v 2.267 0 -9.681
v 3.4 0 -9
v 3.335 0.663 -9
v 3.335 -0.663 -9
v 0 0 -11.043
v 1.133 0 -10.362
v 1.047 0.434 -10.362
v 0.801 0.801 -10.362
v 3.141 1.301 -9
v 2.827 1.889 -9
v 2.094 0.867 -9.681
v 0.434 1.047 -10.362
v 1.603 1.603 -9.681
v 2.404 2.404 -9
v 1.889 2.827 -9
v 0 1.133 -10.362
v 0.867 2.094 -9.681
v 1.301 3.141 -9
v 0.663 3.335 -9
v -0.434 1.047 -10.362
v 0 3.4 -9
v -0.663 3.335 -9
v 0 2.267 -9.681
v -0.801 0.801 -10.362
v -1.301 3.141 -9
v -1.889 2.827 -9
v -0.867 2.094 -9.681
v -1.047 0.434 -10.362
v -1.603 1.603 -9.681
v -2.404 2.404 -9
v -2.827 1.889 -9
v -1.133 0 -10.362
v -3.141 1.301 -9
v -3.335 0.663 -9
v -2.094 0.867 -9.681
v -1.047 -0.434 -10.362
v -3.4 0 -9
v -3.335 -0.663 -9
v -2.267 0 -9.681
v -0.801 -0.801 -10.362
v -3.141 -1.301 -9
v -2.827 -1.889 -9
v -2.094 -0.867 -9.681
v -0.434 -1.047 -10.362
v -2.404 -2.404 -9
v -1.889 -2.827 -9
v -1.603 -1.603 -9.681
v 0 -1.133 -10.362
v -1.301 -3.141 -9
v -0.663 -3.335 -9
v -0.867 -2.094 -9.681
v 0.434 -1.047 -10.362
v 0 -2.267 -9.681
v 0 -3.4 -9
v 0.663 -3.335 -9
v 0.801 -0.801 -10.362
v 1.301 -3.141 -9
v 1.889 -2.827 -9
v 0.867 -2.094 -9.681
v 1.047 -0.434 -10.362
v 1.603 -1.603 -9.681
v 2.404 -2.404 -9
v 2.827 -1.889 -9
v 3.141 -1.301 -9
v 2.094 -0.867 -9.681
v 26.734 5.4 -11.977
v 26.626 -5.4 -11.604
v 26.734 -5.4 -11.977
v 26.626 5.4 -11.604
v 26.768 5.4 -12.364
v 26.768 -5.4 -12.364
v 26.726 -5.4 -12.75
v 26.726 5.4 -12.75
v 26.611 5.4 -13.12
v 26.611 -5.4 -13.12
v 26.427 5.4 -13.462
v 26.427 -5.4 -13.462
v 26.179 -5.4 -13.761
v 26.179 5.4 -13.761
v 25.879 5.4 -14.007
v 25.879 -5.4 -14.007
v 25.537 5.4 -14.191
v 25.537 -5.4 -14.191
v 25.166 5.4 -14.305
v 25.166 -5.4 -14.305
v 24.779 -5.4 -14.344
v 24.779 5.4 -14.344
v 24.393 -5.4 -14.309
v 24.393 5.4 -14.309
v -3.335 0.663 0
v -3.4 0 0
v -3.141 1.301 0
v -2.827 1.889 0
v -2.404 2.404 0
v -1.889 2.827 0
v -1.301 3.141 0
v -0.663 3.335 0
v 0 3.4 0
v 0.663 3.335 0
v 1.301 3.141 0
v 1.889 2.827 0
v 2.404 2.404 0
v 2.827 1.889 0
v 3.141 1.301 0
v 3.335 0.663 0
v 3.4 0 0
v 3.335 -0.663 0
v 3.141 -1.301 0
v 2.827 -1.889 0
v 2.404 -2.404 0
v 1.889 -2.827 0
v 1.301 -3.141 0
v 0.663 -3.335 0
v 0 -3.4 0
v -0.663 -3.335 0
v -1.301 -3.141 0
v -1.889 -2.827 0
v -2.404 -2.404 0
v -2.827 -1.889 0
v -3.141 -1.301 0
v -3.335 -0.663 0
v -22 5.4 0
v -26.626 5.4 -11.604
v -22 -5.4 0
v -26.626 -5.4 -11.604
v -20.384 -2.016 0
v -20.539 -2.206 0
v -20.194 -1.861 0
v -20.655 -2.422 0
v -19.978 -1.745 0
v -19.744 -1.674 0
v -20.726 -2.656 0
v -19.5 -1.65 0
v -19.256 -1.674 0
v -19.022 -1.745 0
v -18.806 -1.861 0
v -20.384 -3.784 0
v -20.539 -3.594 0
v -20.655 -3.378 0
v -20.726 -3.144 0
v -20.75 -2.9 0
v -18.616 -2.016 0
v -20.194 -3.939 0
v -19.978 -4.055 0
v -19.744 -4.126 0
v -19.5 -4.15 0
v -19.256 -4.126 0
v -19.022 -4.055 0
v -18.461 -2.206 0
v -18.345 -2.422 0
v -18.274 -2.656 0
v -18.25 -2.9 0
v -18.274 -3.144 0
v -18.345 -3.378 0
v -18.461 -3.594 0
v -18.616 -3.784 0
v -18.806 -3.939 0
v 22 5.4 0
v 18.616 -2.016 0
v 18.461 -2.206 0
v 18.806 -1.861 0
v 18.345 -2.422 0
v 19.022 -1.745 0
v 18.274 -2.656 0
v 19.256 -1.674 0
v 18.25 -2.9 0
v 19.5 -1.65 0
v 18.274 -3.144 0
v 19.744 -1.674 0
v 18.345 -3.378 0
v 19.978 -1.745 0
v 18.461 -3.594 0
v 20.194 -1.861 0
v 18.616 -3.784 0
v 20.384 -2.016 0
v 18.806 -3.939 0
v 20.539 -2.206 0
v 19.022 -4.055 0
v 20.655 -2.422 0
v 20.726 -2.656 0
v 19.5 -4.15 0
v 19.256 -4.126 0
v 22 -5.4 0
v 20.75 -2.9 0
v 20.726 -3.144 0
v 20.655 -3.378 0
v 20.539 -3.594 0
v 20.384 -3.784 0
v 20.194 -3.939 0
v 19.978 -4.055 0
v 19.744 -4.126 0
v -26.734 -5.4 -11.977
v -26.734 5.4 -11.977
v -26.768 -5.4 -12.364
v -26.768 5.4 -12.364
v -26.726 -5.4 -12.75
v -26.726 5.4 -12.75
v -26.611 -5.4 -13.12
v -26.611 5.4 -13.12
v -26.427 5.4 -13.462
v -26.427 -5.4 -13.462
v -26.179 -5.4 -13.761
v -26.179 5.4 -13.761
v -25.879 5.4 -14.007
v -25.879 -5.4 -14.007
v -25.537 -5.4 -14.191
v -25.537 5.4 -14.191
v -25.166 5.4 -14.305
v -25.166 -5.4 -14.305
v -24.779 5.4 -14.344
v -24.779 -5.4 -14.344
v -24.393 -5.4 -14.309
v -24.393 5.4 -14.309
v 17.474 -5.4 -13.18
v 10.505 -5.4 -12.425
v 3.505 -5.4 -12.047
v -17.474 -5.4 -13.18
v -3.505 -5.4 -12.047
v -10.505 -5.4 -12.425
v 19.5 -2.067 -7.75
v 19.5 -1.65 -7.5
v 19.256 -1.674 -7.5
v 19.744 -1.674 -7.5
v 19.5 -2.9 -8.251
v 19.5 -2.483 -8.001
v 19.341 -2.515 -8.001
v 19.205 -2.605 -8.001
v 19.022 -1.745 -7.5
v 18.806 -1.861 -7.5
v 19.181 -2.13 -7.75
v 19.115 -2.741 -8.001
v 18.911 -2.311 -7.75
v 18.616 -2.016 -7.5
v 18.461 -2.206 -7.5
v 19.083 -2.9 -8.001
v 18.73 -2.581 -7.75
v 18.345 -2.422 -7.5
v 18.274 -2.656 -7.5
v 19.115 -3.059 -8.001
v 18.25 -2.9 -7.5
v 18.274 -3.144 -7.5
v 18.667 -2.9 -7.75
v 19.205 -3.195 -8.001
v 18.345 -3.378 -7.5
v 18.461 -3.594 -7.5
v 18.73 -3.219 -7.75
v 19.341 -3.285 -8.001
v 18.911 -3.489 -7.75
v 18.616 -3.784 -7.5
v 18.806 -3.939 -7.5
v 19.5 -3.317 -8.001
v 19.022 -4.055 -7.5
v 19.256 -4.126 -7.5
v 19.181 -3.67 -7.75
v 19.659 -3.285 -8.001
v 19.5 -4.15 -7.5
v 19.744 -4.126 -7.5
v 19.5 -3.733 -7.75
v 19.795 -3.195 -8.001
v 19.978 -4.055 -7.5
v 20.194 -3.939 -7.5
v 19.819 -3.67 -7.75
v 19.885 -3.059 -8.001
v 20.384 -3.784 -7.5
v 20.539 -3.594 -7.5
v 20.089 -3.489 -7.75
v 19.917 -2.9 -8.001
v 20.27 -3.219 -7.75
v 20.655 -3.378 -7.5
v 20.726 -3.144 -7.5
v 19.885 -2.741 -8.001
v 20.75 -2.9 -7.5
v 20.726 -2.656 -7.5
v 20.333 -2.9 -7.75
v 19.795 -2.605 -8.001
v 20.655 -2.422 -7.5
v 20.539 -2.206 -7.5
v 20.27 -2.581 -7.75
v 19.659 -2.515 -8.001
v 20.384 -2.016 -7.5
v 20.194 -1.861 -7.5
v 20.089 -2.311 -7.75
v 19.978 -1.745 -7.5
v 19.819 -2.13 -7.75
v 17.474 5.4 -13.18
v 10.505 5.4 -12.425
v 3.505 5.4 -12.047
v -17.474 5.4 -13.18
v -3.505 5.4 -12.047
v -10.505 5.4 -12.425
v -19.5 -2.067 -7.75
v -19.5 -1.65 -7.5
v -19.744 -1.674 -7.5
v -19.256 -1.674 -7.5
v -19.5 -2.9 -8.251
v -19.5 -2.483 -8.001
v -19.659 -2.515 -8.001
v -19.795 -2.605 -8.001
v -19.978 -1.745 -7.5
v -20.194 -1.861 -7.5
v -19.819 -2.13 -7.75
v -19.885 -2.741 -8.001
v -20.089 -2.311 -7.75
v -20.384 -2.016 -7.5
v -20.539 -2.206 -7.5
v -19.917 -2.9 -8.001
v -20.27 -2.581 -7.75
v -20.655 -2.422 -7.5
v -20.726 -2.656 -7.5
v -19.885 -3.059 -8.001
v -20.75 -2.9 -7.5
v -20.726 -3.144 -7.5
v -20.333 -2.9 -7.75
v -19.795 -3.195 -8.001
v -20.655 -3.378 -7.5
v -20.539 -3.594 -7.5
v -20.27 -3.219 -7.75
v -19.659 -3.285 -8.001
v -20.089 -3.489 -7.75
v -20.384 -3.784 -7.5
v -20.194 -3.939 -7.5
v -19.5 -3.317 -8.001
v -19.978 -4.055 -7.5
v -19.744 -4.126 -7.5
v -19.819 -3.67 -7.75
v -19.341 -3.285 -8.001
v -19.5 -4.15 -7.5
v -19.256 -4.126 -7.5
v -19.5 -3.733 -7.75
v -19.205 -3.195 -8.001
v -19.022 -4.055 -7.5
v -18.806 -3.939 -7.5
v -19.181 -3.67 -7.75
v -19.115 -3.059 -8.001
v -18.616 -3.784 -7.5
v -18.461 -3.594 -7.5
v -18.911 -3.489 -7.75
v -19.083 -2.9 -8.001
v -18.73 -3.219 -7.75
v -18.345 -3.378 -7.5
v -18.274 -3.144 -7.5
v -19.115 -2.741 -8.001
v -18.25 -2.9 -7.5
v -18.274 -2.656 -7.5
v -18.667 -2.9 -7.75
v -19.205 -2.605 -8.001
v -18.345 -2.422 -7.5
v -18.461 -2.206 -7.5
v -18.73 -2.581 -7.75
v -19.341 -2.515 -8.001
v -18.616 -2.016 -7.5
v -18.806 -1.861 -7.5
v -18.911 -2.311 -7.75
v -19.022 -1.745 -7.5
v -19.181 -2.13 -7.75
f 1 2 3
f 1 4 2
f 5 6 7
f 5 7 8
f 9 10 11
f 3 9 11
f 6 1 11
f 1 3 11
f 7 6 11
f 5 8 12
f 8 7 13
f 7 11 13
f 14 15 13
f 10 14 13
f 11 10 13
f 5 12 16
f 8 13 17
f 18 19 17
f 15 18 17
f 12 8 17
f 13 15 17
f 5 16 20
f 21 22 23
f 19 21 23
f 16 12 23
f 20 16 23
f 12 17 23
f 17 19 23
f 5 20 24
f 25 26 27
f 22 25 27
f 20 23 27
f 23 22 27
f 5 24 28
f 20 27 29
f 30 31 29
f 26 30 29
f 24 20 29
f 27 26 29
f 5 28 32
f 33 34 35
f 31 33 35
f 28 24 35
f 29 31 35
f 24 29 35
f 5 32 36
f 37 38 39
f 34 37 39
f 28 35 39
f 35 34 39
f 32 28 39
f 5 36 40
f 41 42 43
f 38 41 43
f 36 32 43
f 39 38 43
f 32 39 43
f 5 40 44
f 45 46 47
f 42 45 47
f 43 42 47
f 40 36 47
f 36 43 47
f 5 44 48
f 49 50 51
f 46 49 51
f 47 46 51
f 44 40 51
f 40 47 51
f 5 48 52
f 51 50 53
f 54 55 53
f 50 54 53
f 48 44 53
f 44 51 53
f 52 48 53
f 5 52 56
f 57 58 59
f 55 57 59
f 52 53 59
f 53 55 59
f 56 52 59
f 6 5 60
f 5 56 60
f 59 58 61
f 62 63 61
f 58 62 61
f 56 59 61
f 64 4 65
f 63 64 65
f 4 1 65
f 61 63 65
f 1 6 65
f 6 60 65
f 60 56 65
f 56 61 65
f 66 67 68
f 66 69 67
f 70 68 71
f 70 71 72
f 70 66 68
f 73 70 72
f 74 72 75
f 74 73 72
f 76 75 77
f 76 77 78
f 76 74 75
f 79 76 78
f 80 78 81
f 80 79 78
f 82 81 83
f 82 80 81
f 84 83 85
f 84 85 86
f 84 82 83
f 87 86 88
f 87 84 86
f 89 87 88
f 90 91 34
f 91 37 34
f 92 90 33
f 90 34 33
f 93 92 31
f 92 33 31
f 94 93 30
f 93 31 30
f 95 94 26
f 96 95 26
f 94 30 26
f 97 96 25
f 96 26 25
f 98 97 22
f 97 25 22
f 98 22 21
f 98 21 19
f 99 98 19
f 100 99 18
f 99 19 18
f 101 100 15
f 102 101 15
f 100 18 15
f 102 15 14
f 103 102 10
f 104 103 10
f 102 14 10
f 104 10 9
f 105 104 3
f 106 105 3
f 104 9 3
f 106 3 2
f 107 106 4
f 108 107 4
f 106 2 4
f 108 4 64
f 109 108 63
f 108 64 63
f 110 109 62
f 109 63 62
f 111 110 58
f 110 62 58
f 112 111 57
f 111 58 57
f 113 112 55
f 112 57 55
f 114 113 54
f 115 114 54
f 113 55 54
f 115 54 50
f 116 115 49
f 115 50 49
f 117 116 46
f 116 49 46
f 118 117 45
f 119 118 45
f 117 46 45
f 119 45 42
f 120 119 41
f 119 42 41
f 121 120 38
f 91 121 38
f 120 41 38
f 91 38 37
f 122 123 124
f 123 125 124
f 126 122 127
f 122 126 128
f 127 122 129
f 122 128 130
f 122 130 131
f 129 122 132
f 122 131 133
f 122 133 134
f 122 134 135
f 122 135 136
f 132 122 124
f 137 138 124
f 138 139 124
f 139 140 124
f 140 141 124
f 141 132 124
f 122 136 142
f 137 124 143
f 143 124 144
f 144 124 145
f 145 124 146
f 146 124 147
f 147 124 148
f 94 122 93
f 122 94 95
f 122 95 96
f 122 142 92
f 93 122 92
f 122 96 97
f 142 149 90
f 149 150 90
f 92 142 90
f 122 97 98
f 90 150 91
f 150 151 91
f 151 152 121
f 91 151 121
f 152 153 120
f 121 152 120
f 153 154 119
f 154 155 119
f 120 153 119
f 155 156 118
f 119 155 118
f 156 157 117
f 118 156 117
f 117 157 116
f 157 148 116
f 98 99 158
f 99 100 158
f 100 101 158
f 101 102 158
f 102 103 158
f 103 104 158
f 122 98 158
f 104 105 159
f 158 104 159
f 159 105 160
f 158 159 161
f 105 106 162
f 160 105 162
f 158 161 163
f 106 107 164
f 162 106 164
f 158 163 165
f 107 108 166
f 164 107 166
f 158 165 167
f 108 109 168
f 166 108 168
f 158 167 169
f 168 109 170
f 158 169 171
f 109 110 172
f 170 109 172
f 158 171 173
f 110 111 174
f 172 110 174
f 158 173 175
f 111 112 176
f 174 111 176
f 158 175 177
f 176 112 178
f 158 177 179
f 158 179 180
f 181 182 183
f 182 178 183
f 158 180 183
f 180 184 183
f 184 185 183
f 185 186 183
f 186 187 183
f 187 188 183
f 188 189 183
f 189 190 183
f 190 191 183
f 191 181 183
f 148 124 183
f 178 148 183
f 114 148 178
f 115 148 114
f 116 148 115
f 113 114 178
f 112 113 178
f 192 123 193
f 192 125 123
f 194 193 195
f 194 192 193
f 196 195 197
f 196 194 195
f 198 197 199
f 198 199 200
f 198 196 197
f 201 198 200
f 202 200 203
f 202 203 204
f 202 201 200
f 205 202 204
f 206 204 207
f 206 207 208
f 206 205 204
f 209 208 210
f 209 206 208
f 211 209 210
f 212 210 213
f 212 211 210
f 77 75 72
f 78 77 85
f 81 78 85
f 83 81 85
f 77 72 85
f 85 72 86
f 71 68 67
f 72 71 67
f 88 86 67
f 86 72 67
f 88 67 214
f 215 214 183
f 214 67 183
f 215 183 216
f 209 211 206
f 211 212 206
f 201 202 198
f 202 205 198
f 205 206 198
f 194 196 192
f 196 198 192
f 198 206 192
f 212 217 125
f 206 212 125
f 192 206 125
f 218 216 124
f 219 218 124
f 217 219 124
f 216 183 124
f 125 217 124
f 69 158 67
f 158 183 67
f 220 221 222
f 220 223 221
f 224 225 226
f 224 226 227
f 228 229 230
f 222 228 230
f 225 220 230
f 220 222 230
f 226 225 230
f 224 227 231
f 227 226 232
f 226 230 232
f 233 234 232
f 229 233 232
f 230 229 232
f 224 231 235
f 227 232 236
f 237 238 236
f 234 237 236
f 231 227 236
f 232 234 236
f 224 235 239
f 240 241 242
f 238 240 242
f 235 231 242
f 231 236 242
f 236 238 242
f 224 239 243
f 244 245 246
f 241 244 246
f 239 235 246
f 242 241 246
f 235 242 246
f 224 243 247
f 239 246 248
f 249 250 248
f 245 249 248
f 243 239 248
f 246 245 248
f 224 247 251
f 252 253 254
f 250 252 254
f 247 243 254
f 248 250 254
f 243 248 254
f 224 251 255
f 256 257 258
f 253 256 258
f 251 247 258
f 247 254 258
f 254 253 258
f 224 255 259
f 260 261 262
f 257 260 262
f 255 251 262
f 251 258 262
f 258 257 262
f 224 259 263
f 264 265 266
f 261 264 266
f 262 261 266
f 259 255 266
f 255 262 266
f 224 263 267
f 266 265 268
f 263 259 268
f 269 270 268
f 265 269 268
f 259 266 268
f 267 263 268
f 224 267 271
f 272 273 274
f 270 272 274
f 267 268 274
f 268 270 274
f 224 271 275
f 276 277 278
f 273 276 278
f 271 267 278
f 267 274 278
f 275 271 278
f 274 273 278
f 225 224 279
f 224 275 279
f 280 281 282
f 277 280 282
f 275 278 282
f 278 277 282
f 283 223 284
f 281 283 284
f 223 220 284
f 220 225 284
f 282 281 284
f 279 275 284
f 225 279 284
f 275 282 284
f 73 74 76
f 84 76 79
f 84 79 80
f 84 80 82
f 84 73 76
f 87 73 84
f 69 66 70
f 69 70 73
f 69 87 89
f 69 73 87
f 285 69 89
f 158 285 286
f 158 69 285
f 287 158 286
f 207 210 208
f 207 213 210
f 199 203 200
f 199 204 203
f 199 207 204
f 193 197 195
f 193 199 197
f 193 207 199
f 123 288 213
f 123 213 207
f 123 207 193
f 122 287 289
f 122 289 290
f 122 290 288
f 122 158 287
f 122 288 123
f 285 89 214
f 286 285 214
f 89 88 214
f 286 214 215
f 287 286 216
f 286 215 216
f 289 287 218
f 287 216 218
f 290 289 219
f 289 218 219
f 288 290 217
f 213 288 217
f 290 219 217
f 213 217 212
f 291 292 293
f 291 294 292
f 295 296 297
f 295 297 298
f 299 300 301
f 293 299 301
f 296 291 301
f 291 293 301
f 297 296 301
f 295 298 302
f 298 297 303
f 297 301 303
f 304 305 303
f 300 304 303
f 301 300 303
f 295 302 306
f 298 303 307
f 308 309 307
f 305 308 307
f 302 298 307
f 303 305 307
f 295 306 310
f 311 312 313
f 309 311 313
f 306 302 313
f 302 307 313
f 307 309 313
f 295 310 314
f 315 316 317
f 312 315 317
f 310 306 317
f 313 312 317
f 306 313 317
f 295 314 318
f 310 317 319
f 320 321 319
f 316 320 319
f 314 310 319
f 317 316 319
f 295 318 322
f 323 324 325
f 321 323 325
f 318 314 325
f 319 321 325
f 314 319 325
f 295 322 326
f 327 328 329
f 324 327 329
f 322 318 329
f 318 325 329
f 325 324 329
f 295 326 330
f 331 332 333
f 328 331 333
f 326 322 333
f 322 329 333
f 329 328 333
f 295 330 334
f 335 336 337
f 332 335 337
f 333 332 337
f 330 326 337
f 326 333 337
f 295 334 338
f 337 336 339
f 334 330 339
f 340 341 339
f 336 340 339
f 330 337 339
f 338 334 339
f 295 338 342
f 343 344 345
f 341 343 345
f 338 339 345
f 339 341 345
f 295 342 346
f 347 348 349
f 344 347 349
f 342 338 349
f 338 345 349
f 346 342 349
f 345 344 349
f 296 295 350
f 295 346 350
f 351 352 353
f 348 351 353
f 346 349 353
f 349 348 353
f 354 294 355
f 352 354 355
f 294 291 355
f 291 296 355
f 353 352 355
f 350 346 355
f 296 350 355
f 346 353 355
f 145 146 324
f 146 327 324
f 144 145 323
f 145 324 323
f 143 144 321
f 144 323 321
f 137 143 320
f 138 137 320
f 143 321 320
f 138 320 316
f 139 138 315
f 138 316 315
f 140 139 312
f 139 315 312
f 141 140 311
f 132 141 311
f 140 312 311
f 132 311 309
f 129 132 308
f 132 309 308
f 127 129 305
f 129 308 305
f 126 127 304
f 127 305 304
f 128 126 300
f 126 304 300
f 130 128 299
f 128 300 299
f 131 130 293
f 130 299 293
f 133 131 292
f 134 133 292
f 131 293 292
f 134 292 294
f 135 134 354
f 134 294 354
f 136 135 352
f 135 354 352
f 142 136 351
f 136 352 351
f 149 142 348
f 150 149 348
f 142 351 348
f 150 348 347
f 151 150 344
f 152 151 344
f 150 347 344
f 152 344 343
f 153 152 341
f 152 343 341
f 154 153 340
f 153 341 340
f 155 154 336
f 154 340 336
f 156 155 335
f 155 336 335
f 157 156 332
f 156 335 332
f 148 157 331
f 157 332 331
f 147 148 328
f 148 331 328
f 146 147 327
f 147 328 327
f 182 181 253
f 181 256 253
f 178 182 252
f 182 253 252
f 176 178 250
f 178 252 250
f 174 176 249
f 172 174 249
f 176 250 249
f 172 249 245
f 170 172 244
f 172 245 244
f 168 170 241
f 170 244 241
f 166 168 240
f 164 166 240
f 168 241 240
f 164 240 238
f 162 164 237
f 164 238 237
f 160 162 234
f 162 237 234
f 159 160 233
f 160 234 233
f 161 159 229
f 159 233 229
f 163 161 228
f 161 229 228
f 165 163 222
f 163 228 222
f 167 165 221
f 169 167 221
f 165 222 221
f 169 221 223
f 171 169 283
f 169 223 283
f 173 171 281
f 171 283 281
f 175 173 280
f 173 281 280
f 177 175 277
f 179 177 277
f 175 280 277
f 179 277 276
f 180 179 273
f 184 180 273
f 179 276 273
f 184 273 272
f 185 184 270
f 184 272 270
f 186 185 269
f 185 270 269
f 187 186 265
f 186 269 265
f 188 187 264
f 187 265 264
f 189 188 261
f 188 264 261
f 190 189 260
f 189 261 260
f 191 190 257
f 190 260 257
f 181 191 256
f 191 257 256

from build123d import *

# Parameters (mm, degrees)
SKETCH_1_R                = 5.4
EXTRUDE_1_DEPTH           = 45
EXTRUDE_3_DEPTH           = 5.4
M8X1_0_TAPPED_HOLE1_D     = 7
M8X1_0_TAPPED_HOLE1_DEPTH = 13
M8X1_0_TAPPED_HOLE1_TIP   = 2.103012167
M3_TAPPED_HOLE1_D         = 2.5
M3_TAPPED_HOLE1_DEPTH     = 7.5
M3_TAPPED_HOLE1_TIP       = 0.751075774
CHAMFER_2_SIZE            = 0.5
SKETCH_9_R                = 4.25
CUT_EXTRUDE_5_DEPTH       = 2
CHAMFER_3_SIZE            = 0.5
SKETCH_10_R               = 6.935438506
CUT_EXTRUDE_1_DEPTH       = 86
HOLE_WIZARD_M8_1_D        = 6.8
HOLE_WIZARD_M8_1_DEPTH    = 9
HOLE_WIZARD_M8_1_TIP      = 2.042926105
FILLET_1_R                = 2


with BuildPart() as part:
    # 草图1 → 拉伸1 (new body)
    with BuildSketch(Plane.XY):
        with Locations(Location((0, 0, 0), (0, 0, 180))):
            Circle(SKETCH_1_R)
    extrude(amount=EXTRUDE_1_DEPTH)

    # 草图4 → 拉伸3 (add, symmetric)
    with BuildSketch(Plane.XZ):
        with BuildLine():
            Line((-22, 0), (22, 0))
            Line((22, 0), (28, -15.05119142))
            ThreePointArc((28, -15.05119142), (0, -12), (-28, -15.05119142))
            Line((-28, -15.05119142), (-22, 0))
        make_face()
    extrude(amount=EXTRUDE_3_DEPTH, both=True)

    # M8x1.0 Tapped Hole1
    with Locations(Plane.XY.offset(45)):
        with Locations((0, 0)):
            Hole(M8X1_0_TAPPED_HOLE1_D / 2, depth=M8X1_0_TAPPED_HOLE1_DEPTH)
            with Locations((0, 0, -(M8X1_0_TAPPED_HOLE1_DEPTH + M8X1_0_TAPPED_HOLE1_TIP / 2))):  # 118° drill point
                Cone(0, M8X1_0_TAPPED_HOLE1_D / 2, M8X1_0_TAPPED_HOLE1_TIP, mode=Mode.SUBTRACT)

    # M3 Tapped Hole1
    with Locations(Plane(origin=(-19.5, -2.9, 0), x_dir=(0, 1, 0), z_dir=(0, 0, 1))):
        with Locations((0, 0), (0, -39)):
            Hole(M3_TAPPED_HOLE1_D / 2, depth=M3_TAPPED_HOLE1_DEPTH)
            with Locations((0, 0, -(M3_TAPPED_HOLE1_DEPTH + M3_TAPPED_HOLE1_TIP / 2))):  # 118° drill point
                Cone(0, M3_TAPPED_HOLE1_D / 2, M3_TAPPED_HOLE1_TIP, mode=Mode.SUBTRACT)

    # 倒角2
    chamfer_2_edges = [part.edges().sort_by_distance(p)[0] for p in [
        (5.4, 0, 45),
    ]]
    chamfer(chamfer_2_edges, length=CHAMFER_2_SIZE)

    # 草图9 → 拉伸5 (cut)
    with BuildSketch(Plane.XY.offset(45)):
        Circle(SKETCH_9_R)
    extrude(amount=-CUT_EXTRUDE_5_DEPTH, mode=Mode.SUBTRACT)

    # 倒角3
    chamfer_3_edges = [part.edges().sort_by_distance(p)[0] for p in [
        (-4.25, 0, 45),
        (3.5, 0, 43),
    ]]
    chamfer(chamfer_3_edges, length=CHAMFER_3_SIZE)

    # 草图10 → 切除-拉伸1 (cut)
    with BuildSketch(Plane.XY):
        Circle(SKETCH_10_R)
    extrude(amount=CUT_EXTRUDE_1_DEPTH, mode=Mode.SUBTRACT)

    # M8 螺纹孔1
    with Locations(Plane.XY):
        with Locations((0, 0)):
            Hole(HOLE_WIZARD_M8_1_D / 2, depth=HOLE_WIZARD_M8_1_DEPTH)
            with Locations((0, 0, -(HOLE_WIZARD_M8_1_DEPTH + HOLE_WIZARD_M8_1_TIP / 2))):  # 118° drill point
                Cone(0, HOLE_WIZARD_M8_1_D / 2, HOLE_WIZARD_M8_1_TIP, mode=Mode.SUBTRACT)

    # 圆角1
    fillet_1_edges = [part.edges().sort_by_distance(p)[0] for p in [
        (-28, 0, -15.05119142),
        (28, 0, -15.05119142),
    ]]
    fillet(fillet_1_edges, radius=FILLET_1_R)


solid = part.part
